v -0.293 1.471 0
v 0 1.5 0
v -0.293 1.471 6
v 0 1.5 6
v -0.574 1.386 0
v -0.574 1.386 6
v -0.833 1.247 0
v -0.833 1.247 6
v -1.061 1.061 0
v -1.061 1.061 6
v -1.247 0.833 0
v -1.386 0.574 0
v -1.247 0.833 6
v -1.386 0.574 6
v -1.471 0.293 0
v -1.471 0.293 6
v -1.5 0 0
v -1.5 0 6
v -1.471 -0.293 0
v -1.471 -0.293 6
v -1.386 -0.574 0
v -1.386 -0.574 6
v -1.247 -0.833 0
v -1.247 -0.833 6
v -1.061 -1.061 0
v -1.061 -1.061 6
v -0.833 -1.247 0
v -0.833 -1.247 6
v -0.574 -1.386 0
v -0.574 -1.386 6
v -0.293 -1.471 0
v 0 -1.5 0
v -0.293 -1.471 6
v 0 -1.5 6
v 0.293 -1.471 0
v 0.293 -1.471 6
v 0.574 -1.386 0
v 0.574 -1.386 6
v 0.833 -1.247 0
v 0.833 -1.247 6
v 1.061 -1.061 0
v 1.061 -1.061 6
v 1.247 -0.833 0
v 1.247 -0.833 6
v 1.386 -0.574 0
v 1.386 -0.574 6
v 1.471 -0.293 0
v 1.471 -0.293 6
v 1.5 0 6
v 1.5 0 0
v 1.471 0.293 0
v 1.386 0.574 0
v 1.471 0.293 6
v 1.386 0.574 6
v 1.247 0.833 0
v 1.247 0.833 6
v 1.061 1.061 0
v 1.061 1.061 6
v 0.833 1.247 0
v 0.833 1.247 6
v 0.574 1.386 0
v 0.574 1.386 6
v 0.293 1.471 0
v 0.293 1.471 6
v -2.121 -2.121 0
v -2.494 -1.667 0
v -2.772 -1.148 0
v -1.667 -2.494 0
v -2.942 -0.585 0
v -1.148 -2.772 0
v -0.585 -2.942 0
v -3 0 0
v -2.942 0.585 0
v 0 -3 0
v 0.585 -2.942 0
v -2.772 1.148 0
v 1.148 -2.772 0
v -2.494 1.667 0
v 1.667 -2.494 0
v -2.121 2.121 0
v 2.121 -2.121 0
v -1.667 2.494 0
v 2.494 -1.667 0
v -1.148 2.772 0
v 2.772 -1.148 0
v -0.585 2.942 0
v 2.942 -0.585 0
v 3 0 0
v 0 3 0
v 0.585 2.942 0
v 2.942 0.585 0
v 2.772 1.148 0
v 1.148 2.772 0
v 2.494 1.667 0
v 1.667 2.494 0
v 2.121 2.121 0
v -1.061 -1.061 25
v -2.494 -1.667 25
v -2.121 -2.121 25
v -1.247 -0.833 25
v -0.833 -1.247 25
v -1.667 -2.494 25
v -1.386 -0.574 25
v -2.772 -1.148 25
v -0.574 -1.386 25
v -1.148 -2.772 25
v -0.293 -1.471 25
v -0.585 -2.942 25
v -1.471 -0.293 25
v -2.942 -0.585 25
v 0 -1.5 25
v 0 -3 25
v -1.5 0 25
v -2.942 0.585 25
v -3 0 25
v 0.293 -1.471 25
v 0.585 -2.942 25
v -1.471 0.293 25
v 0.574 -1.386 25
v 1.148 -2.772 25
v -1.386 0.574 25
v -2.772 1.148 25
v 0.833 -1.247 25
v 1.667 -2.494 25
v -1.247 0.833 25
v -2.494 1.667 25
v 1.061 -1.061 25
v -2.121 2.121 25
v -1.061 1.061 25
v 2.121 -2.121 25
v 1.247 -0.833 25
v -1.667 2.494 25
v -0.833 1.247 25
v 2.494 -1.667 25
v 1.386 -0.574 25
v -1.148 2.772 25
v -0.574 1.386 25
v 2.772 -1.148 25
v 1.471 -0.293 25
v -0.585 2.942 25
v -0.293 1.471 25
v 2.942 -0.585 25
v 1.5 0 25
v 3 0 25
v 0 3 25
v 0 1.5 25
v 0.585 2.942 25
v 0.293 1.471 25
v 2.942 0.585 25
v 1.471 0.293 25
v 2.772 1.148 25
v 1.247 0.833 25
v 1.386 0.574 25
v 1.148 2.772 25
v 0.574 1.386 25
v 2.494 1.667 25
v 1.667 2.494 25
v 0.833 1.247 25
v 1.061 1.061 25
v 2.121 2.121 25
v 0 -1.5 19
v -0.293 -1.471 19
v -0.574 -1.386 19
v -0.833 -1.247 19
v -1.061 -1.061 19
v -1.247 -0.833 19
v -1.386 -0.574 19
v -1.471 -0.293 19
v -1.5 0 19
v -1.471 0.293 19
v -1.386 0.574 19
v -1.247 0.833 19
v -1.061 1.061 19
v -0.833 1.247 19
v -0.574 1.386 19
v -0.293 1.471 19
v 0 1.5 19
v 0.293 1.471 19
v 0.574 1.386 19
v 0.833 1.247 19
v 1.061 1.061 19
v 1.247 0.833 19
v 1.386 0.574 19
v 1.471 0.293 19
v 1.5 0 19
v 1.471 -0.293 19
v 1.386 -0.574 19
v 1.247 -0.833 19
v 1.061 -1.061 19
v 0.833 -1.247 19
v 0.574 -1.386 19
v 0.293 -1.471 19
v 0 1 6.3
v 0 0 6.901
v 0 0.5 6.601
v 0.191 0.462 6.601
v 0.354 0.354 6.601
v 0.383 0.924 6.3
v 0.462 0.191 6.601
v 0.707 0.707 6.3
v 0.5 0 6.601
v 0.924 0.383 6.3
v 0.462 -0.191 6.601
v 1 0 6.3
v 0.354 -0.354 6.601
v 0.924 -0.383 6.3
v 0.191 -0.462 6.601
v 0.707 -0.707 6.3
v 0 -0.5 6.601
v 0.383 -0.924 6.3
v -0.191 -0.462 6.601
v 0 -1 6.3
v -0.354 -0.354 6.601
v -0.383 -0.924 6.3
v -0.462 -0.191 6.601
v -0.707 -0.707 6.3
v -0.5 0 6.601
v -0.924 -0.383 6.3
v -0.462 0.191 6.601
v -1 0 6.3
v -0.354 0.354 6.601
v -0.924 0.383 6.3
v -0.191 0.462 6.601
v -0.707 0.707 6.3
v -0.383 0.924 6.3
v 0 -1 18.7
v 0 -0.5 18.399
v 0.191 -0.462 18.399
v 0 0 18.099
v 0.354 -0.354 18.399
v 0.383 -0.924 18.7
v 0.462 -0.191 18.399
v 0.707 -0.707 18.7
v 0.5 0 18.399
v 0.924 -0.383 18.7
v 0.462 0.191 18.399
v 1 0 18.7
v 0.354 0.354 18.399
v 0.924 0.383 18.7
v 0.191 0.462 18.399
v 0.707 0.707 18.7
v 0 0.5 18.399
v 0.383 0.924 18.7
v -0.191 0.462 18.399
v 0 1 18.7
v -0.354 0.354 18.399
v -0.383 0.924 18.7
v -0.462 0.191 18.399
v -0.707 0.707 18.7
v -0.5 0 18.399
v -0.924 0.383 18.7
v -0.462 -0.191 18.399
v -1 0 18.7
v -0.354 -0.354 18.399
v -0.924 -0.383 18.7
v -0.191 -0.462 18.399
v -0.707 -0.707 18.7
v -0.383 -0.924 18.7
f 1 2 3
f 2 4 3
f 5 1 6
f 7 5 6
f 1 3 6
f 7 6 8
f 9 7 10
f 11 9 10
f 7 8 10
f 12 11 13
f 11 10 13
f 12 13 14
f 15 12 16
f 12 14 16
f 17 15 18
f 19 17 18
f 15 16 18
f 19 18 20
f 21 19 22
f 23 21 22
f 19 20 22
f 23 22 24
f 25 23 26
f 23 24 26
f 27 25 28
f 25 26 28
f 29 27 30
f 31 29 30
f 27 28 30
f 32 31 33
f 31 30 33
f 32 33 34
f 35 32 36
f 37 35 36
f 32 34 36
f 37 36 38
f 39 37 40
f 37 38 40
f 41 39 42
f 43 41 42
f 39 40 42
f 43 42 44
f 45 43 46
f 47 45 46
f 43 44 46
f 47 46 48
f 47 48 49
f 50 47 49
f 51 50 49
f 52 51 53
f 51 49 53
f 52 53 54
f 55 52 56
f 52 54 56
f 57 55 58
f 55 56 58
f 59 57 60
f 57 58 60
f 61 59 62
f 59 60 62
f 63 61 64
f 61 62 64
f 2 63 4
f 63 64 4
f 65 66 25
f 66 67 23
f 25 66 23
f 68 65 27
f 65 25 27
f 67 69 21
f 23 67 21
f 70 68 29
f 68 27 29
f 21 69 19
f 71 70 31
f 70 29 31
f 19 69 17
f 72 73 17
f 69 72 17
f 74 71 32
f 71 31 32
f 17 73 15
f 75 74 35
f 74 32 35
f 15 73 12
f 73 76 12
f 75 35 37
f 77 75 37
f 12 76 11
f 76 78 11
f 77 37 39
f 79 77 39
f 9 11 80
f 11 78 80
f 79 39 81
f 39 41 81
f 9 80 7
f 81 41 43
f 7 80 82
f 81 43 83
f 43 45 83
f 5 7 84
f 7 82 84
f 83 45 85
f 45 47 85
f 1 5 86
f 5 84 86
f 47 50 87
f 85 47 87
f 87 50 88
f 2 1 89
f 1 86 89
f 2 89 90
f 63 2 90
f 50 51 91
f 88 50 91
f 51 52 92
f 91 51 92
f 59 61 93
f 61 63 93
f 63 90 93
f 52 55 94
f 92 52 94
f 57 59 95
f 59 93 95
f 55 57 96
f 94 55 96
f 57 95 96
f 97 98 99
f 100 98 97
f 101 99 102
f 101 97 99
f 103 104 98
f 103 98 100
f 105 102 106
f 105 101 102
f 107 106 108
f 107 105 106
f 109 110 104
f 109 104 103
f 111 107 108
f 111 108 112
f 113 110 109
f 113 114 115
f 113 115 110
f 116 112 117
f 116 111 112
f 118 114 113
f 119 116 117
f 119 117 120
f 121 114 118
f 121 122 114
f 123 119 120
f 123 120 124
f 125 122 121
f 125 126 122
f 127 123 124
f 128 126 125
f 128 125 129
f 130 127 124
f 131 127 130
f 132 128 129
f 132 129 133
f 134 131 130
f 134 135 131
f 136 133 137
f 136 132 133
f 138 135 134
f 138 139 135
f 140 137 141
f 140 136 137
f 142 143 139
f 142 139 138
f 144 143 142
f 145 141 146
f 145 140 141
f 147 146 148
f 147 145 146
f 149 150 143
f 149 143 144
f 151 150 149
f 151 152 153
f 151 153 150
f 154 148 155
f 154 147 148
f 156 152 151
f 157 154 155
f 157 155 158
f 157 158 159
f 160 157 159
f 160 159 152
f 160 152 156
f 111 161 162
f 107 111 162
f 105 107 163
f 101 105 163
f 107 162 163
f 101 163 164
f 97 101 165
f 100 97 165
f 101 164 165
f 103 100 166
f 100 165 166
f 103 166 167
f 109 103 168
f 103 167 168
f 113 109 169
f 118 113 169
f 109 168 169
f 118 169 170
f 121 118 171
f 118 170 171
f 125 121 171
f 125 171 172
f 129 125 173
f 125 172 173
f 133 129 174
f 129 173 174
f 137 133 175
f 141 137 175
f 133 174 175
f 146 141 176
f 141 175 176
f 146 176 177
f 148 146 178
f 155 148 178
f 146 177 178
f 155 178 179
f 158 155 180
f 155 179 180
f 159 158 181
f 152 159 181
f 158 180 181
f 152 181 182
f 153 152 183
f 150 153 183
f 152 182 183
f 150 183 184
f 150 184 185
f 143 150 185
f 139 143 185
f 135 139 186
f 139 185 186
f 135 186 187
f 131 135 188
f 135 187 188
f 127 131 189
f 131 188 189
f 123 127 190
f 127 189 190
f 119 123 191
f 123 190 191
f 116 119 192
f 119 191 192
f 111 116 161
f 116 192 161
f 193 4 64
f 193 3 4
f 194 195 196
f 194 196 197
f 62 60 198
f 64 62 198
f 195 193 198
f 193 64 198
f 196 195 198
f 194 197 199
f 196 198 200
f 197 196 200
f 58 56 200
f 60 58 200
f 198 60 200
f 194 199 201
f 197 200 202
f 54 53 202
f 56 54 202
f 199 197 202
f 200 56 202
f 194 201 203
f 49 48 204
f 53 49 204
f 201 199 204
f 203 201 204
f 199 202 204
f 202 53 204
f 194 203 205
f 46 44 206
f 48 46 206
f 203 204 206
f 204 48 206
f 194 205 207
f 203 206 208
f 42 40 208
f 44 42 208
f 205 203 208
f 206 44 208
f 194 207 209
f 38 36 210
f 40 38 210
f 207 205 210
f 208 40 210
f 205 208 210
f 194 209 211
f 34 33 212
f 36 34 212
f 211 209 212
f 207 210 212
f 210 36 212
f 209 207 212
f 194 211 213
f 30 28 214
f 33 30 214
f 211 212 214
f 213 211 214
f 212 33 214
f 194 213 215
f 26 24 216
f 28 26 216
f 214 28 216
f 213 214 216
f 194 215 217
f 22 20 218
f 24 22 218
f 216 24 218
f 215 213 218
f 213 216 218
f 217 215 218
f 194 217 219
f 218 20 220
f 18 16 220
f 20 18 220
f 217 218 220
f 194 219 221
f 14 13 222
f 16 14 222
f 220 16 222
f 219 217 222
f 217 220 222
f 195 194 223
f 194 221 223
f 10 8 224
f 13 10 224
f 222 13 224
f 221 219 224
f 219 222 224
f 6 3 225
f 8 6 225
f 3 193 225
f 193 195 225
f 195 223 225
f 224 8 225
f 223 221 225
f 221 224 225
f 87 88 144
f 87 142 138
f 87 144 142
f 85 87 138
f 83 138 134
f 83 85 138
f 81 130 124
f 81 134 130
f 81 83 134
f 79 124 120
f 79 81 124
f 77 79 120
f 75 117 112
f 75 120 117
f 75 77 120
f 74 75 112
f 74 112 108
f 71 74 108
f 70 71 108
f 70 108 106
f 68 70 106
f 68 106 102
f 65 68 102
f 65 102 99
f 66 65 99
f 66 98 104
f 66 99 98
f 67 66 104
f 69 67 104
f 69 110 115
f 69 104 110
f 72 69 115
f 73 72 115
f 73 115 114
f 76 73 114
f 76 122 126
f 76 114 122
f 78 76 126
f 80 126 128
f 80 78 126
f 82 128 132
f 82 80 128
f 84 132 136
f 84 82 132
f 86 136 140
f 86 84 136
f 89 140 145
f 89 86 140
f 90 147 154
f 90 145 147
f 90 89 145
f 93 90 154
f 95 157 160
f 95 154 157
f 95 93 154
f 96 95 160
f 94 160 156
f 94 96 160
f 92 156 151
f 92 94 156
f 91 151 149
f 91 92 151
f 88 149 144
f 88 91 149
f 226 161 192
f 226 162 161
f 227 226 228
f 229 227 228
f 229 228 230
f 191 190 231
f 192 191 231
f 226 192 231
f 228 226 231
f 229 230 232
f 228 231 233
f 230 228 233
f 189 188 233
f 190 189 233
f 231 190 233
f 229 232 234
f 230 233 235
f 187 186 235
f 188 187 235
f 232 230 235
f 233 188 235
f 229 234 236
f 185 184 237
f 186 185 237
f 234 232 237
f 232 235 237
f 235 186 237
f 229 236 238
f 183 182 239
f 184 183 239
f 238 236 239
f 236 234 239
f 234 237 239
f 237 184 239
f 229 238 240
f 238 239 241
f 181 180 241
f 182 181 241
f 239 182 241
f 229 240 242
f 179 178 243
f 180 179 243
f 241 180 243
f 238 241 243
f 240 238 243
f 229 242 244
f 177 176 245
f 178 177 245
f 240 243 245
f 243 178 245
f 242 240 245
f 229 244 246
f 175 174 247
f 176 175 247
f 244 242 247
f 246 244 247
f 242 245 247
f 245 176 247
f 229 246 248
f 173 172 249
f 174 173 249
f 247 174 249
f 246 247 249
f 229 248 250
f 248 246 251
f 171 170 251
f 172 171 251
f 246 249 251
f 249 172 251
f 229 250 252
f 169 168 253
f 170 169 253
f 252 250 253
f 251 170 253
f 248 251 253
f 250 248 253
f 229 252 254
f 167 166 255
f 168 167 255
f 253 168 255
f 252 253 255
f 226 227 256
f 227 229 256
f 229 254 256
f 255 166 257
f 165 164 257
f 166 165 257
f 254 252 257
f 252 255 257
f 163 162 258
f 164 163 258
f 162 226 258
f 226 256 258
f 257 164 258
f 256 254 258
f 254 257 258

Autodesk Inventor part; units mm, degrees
ref_plane "YZ Plane" through (0, 0, 0) normal (1, 0, 0) x (0, 1, 0)
ref_plane "XZ Plane" through (0, 0, 0) normal (0, 1, 0) x (-1, 0, 0)
ref_plane "XY Plane" through (0, 0, 0) normal (0, 0, 1) x (1, 0, 0)
sketch "スケッチ1" plane through (0, 0, 0) normal (0, 0, 1) x (1, 0, 0)
  circle A0 centre (0, 0) radius 3
  dimension "d0" = 6
extrude "押し出し1" add sketch "スケッチ1" along normal blind 25
hole "穴1" at (0, 0, 0) direction (0, 0, 1) diameter 3 depth 6 tip angle 118
sketch "スケッチ2" plane through (0, 0, 25) normal (0, 0, 1) x (1, 0, 0)
  circle A0 centre (0, 0) radius 3 projected
hole "穴2" at (0, 0, 25) direction (0, 0, -1) diameter 3 depth 6 tip angle 118
properties part number "スペーサ　m3-l25" material "アルミニウム 2014-T4"
